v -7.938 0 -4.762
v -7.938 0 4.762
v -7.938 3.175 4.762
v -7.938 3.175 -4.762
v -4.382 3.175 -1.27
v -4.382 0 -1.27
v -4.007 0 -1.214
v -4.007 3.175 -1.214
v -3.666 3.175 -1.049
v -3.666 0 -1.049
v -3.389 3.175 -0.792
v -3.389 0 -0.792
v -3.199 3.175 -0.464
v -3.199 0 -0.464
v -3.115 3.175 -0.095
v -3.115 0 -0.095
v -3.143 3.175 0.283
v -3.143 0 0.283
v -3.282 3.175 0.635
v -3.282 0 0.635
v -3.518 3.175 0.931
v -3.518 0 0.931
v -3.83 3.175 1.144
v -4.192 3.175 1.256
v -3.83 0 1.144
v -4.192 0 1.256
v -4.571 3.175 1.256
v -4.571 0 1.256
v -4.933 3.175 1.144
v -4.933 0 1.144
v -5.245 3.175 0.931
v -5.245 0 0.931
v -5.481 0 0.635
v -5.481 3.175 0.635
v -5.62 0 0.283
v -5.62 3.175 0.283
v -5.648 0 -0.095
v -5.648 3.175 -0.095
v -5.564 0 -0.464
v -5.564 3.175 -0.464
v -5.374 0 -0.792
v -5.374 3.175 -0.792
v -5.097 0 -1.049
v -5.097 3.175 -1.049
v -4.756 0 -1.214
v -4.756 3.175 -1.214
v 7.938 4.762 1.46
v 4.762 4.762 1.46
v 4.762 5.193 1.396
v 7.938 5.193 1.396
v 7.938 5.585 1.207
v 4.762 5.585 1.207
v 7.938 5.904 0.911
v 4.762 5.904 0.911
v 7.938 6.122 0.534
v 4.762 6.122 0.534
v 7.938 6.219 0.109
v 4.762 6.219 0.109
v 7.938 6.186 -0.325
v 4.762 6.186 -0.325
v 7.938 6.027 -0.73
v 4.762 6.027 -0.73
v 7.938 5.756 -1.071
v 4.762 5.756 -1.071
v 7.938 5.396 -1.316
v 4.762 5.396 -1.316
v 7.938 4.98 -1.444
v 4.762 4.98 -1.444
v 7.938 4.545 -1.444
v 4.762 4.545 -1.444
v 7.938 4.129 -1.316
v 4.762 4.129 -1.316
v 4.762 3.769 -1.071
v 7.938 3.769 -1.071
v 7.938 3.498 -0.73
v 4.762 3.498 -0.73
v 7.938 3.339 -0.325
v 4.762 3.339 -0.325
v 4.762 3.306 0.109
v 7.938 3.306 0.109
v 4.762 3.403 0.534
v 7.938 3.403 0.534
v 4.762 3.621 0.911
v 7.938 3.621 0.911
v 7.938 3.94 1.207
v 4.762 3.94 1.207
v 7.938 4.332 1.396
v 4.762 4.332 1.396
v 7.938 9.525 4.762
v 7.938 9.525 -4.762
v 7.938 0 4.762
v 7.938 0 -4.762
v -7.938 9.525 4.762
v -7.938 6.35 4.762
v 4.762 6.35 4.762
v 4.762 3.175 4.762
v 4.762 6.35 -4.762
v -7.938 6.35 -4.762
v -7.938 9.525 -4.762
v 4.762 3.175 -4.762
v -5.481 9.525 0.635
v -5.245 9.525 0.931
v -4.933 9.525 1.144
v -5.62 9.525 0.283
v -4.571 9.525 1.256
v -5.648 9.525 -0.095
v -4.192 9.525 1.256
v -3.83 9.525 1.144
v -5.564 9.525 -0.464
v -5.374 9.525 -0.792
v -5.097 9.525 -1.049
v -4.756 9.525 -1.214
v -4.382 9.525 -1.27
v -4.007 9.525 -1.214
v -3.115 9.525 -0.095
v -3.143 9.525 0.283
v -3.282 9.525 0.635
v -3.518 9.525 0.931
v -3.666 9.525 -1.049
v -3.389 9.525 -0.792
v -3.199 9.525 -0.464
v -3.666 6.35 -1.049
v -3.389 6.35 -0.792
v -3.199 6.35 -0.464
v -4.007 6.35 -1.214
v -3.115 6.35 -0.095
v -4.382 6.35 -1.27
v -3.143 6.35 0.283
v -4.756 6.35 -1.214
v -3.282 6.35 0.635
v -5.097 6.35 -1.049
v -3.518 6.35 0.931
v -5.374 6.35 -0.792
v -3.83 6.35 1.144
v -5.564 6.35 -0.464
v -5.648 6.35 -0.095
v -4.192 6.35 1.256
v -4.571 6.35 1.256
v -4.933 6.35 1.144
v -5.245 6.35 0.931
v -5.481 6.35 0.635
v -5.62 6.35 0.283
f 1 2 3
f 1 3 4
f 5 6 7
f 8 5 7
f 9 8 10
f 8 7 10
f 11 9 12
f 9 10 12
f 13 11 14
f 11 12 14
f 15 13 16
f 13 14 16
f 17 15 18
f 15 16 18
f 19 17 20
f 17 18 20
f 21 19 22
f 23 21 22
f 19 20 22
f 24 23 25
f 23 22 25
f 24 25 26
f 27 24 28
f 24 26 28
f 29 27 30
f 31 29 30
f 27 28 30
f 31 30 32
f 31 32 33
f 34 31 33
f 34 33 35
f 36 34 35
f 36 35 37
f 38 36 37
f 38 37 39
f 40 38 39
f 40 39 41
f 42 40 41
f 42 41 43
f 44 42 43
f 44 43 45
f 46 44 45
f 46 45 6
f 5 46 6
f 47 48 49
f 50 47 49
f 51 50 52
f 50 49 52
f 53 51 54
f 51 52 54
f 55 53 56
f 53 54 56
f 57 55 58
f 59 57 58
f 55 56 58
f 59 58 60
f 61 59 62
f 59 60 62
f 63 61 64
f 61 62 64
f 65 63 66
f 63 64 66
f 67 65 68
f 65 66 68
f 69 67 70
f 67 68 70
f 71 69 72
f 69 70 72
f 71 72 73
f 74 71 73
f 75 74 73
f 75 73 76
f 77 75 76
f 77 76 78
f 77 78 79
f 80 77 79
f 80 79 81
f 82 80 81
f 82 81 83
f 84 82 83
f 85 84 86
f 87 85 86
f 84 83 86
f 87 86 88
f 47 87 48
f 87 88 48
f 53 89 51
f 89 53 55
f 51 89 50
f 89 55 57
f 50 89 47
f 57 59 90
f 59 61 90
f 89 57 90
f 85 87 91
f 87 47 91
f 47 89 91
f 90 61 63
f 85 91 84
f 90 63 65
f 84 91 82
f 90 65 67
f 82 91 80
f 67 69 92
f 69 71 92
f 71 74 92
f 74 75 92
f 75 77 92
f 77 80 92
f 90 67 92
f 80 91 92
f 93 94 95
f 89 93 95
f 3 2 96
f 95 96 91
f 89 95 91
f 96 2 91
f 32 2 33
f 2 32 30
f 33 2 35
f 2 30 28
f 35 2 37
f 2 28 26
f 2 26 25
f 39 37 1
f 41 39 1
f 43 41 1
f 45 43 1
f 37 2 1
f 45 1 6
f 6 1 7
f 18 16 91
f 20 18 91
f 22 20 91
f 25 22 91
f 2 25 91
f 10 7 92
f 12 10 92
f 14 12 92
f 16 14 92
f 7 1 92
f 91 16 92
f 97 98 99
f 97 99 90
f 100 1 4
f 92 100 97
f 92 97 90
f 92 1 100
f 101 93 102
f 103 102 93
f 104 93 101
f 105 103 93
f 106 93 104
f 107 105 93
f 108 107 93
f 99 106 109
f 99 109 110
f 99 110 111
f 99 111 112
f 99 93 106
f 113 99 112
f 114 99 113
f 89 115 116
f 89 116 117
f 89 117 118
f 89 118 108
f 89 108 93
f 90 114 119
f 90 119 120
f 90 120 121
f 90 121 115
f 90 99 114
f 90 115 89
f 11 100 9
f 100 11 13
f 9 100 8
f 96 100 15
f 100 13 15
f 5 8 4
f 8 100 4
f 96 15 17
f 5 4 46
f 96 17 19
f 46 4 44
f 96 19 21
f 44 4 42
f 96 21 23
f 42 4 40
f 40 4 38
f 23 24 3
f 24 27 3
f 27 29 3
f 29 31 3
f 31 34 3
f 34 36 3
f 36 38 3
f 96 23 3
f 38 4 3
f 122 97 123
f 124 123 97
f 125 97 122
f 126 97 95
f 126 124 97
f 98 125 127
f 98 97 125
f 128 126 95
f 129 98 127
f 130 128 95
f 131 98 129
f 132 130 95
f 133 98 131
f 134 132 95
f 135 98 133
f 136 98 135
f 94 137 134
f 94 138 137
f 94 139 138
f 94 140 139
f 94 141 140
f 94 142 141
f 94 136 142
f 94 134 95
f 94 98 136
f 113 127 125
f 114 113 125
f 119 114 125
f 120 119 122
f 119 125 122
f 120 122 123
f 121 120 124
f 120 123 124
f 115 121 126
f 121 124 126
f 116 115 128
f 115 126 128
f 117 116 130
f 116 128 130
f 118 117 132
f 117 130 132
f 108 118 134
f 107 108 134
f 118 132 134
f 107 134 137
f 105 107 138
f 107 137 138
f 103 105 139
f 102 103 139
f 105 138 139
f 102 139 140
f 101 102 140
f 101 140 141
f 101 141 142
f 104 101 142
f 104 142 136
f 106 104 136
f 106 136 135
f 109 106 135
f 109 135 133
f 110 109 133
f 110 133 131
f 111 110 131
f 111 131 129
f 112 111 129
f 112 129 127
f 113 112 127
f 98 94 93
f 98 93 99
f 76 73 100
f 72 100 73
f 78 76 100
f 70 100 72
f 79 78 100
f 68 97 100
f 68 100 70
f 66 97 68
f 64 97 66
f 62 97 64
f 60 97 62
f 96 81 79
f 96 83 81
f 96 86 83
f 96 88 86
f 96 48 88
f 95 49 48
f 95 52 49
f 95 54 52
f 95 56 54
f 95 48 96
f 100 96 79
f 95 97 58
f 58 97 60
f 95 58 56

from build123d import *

# Parameters (mm, degrees)
SKETCH1_W           = 15.875
SKETCH1_H           = 9.525
BOSS_EXTRUDE1_DEPTH = 9.525
SKETCH2_W           = 9.525
SKETCH2_H           = 3.175
CUT_EXTRUDE1_DEPTH  = 12.7
SKETCH3_R           = 1.27
CUT_EXTRUDE2_DEPTH  = 9.525
SKETCH4_R           = 1.4605
CUT_EXTRUDE3_DEPTH  = 3.175


with BuildPart() as part:
    # Sketch1 → Boss-Extrude1 (new body)
    with BuildSketch(Plane(origin=(0, 0, 0), x_dir=(1, 0, 0), z_dir=(0, 1, 0))):
        Rectangle(SKETCH1_W, SKETCH1_H)
    extrude(amount=BOSS_EXTRUDE1_DEPTH)

    # Sketch2 → Cut-Extrude1 (cut)
    with BuildSketch(Plane.ZY.offset(7.9375)):
        with Locations((0, 4.7625)):
            Rectangle(SKETCH2_W, SKETCH2_H)
    extrude(amount=-CUT_EXTRUDE1_DEPTH, mode=Mode.SUBTRACT)

    # Sketch3 → Cut-Extrude2 (cut)
    with BuildSketch(Plane.XZ):
        with Locations(Location((-4.3815, 0, 0), (0, 0, 270))):
            Circle(SKETCH3_R)
    extrude(amount=-CUT_EXTRUDE2_DEPTH, mode=Mode.SUBTRACT)

    # Sketch4 → Cut-Extrude3 (cut)
    with BuildSketch(Plane.ZY.offset(-4.7625)):
        with Locations((0, 4.7625)):
            Circle(SKETCH4_R)
    extrude(amount=-CUT_EXTRUDE3_DEPTH, mode=Mode.SUBTRACT)


solid = part.part
